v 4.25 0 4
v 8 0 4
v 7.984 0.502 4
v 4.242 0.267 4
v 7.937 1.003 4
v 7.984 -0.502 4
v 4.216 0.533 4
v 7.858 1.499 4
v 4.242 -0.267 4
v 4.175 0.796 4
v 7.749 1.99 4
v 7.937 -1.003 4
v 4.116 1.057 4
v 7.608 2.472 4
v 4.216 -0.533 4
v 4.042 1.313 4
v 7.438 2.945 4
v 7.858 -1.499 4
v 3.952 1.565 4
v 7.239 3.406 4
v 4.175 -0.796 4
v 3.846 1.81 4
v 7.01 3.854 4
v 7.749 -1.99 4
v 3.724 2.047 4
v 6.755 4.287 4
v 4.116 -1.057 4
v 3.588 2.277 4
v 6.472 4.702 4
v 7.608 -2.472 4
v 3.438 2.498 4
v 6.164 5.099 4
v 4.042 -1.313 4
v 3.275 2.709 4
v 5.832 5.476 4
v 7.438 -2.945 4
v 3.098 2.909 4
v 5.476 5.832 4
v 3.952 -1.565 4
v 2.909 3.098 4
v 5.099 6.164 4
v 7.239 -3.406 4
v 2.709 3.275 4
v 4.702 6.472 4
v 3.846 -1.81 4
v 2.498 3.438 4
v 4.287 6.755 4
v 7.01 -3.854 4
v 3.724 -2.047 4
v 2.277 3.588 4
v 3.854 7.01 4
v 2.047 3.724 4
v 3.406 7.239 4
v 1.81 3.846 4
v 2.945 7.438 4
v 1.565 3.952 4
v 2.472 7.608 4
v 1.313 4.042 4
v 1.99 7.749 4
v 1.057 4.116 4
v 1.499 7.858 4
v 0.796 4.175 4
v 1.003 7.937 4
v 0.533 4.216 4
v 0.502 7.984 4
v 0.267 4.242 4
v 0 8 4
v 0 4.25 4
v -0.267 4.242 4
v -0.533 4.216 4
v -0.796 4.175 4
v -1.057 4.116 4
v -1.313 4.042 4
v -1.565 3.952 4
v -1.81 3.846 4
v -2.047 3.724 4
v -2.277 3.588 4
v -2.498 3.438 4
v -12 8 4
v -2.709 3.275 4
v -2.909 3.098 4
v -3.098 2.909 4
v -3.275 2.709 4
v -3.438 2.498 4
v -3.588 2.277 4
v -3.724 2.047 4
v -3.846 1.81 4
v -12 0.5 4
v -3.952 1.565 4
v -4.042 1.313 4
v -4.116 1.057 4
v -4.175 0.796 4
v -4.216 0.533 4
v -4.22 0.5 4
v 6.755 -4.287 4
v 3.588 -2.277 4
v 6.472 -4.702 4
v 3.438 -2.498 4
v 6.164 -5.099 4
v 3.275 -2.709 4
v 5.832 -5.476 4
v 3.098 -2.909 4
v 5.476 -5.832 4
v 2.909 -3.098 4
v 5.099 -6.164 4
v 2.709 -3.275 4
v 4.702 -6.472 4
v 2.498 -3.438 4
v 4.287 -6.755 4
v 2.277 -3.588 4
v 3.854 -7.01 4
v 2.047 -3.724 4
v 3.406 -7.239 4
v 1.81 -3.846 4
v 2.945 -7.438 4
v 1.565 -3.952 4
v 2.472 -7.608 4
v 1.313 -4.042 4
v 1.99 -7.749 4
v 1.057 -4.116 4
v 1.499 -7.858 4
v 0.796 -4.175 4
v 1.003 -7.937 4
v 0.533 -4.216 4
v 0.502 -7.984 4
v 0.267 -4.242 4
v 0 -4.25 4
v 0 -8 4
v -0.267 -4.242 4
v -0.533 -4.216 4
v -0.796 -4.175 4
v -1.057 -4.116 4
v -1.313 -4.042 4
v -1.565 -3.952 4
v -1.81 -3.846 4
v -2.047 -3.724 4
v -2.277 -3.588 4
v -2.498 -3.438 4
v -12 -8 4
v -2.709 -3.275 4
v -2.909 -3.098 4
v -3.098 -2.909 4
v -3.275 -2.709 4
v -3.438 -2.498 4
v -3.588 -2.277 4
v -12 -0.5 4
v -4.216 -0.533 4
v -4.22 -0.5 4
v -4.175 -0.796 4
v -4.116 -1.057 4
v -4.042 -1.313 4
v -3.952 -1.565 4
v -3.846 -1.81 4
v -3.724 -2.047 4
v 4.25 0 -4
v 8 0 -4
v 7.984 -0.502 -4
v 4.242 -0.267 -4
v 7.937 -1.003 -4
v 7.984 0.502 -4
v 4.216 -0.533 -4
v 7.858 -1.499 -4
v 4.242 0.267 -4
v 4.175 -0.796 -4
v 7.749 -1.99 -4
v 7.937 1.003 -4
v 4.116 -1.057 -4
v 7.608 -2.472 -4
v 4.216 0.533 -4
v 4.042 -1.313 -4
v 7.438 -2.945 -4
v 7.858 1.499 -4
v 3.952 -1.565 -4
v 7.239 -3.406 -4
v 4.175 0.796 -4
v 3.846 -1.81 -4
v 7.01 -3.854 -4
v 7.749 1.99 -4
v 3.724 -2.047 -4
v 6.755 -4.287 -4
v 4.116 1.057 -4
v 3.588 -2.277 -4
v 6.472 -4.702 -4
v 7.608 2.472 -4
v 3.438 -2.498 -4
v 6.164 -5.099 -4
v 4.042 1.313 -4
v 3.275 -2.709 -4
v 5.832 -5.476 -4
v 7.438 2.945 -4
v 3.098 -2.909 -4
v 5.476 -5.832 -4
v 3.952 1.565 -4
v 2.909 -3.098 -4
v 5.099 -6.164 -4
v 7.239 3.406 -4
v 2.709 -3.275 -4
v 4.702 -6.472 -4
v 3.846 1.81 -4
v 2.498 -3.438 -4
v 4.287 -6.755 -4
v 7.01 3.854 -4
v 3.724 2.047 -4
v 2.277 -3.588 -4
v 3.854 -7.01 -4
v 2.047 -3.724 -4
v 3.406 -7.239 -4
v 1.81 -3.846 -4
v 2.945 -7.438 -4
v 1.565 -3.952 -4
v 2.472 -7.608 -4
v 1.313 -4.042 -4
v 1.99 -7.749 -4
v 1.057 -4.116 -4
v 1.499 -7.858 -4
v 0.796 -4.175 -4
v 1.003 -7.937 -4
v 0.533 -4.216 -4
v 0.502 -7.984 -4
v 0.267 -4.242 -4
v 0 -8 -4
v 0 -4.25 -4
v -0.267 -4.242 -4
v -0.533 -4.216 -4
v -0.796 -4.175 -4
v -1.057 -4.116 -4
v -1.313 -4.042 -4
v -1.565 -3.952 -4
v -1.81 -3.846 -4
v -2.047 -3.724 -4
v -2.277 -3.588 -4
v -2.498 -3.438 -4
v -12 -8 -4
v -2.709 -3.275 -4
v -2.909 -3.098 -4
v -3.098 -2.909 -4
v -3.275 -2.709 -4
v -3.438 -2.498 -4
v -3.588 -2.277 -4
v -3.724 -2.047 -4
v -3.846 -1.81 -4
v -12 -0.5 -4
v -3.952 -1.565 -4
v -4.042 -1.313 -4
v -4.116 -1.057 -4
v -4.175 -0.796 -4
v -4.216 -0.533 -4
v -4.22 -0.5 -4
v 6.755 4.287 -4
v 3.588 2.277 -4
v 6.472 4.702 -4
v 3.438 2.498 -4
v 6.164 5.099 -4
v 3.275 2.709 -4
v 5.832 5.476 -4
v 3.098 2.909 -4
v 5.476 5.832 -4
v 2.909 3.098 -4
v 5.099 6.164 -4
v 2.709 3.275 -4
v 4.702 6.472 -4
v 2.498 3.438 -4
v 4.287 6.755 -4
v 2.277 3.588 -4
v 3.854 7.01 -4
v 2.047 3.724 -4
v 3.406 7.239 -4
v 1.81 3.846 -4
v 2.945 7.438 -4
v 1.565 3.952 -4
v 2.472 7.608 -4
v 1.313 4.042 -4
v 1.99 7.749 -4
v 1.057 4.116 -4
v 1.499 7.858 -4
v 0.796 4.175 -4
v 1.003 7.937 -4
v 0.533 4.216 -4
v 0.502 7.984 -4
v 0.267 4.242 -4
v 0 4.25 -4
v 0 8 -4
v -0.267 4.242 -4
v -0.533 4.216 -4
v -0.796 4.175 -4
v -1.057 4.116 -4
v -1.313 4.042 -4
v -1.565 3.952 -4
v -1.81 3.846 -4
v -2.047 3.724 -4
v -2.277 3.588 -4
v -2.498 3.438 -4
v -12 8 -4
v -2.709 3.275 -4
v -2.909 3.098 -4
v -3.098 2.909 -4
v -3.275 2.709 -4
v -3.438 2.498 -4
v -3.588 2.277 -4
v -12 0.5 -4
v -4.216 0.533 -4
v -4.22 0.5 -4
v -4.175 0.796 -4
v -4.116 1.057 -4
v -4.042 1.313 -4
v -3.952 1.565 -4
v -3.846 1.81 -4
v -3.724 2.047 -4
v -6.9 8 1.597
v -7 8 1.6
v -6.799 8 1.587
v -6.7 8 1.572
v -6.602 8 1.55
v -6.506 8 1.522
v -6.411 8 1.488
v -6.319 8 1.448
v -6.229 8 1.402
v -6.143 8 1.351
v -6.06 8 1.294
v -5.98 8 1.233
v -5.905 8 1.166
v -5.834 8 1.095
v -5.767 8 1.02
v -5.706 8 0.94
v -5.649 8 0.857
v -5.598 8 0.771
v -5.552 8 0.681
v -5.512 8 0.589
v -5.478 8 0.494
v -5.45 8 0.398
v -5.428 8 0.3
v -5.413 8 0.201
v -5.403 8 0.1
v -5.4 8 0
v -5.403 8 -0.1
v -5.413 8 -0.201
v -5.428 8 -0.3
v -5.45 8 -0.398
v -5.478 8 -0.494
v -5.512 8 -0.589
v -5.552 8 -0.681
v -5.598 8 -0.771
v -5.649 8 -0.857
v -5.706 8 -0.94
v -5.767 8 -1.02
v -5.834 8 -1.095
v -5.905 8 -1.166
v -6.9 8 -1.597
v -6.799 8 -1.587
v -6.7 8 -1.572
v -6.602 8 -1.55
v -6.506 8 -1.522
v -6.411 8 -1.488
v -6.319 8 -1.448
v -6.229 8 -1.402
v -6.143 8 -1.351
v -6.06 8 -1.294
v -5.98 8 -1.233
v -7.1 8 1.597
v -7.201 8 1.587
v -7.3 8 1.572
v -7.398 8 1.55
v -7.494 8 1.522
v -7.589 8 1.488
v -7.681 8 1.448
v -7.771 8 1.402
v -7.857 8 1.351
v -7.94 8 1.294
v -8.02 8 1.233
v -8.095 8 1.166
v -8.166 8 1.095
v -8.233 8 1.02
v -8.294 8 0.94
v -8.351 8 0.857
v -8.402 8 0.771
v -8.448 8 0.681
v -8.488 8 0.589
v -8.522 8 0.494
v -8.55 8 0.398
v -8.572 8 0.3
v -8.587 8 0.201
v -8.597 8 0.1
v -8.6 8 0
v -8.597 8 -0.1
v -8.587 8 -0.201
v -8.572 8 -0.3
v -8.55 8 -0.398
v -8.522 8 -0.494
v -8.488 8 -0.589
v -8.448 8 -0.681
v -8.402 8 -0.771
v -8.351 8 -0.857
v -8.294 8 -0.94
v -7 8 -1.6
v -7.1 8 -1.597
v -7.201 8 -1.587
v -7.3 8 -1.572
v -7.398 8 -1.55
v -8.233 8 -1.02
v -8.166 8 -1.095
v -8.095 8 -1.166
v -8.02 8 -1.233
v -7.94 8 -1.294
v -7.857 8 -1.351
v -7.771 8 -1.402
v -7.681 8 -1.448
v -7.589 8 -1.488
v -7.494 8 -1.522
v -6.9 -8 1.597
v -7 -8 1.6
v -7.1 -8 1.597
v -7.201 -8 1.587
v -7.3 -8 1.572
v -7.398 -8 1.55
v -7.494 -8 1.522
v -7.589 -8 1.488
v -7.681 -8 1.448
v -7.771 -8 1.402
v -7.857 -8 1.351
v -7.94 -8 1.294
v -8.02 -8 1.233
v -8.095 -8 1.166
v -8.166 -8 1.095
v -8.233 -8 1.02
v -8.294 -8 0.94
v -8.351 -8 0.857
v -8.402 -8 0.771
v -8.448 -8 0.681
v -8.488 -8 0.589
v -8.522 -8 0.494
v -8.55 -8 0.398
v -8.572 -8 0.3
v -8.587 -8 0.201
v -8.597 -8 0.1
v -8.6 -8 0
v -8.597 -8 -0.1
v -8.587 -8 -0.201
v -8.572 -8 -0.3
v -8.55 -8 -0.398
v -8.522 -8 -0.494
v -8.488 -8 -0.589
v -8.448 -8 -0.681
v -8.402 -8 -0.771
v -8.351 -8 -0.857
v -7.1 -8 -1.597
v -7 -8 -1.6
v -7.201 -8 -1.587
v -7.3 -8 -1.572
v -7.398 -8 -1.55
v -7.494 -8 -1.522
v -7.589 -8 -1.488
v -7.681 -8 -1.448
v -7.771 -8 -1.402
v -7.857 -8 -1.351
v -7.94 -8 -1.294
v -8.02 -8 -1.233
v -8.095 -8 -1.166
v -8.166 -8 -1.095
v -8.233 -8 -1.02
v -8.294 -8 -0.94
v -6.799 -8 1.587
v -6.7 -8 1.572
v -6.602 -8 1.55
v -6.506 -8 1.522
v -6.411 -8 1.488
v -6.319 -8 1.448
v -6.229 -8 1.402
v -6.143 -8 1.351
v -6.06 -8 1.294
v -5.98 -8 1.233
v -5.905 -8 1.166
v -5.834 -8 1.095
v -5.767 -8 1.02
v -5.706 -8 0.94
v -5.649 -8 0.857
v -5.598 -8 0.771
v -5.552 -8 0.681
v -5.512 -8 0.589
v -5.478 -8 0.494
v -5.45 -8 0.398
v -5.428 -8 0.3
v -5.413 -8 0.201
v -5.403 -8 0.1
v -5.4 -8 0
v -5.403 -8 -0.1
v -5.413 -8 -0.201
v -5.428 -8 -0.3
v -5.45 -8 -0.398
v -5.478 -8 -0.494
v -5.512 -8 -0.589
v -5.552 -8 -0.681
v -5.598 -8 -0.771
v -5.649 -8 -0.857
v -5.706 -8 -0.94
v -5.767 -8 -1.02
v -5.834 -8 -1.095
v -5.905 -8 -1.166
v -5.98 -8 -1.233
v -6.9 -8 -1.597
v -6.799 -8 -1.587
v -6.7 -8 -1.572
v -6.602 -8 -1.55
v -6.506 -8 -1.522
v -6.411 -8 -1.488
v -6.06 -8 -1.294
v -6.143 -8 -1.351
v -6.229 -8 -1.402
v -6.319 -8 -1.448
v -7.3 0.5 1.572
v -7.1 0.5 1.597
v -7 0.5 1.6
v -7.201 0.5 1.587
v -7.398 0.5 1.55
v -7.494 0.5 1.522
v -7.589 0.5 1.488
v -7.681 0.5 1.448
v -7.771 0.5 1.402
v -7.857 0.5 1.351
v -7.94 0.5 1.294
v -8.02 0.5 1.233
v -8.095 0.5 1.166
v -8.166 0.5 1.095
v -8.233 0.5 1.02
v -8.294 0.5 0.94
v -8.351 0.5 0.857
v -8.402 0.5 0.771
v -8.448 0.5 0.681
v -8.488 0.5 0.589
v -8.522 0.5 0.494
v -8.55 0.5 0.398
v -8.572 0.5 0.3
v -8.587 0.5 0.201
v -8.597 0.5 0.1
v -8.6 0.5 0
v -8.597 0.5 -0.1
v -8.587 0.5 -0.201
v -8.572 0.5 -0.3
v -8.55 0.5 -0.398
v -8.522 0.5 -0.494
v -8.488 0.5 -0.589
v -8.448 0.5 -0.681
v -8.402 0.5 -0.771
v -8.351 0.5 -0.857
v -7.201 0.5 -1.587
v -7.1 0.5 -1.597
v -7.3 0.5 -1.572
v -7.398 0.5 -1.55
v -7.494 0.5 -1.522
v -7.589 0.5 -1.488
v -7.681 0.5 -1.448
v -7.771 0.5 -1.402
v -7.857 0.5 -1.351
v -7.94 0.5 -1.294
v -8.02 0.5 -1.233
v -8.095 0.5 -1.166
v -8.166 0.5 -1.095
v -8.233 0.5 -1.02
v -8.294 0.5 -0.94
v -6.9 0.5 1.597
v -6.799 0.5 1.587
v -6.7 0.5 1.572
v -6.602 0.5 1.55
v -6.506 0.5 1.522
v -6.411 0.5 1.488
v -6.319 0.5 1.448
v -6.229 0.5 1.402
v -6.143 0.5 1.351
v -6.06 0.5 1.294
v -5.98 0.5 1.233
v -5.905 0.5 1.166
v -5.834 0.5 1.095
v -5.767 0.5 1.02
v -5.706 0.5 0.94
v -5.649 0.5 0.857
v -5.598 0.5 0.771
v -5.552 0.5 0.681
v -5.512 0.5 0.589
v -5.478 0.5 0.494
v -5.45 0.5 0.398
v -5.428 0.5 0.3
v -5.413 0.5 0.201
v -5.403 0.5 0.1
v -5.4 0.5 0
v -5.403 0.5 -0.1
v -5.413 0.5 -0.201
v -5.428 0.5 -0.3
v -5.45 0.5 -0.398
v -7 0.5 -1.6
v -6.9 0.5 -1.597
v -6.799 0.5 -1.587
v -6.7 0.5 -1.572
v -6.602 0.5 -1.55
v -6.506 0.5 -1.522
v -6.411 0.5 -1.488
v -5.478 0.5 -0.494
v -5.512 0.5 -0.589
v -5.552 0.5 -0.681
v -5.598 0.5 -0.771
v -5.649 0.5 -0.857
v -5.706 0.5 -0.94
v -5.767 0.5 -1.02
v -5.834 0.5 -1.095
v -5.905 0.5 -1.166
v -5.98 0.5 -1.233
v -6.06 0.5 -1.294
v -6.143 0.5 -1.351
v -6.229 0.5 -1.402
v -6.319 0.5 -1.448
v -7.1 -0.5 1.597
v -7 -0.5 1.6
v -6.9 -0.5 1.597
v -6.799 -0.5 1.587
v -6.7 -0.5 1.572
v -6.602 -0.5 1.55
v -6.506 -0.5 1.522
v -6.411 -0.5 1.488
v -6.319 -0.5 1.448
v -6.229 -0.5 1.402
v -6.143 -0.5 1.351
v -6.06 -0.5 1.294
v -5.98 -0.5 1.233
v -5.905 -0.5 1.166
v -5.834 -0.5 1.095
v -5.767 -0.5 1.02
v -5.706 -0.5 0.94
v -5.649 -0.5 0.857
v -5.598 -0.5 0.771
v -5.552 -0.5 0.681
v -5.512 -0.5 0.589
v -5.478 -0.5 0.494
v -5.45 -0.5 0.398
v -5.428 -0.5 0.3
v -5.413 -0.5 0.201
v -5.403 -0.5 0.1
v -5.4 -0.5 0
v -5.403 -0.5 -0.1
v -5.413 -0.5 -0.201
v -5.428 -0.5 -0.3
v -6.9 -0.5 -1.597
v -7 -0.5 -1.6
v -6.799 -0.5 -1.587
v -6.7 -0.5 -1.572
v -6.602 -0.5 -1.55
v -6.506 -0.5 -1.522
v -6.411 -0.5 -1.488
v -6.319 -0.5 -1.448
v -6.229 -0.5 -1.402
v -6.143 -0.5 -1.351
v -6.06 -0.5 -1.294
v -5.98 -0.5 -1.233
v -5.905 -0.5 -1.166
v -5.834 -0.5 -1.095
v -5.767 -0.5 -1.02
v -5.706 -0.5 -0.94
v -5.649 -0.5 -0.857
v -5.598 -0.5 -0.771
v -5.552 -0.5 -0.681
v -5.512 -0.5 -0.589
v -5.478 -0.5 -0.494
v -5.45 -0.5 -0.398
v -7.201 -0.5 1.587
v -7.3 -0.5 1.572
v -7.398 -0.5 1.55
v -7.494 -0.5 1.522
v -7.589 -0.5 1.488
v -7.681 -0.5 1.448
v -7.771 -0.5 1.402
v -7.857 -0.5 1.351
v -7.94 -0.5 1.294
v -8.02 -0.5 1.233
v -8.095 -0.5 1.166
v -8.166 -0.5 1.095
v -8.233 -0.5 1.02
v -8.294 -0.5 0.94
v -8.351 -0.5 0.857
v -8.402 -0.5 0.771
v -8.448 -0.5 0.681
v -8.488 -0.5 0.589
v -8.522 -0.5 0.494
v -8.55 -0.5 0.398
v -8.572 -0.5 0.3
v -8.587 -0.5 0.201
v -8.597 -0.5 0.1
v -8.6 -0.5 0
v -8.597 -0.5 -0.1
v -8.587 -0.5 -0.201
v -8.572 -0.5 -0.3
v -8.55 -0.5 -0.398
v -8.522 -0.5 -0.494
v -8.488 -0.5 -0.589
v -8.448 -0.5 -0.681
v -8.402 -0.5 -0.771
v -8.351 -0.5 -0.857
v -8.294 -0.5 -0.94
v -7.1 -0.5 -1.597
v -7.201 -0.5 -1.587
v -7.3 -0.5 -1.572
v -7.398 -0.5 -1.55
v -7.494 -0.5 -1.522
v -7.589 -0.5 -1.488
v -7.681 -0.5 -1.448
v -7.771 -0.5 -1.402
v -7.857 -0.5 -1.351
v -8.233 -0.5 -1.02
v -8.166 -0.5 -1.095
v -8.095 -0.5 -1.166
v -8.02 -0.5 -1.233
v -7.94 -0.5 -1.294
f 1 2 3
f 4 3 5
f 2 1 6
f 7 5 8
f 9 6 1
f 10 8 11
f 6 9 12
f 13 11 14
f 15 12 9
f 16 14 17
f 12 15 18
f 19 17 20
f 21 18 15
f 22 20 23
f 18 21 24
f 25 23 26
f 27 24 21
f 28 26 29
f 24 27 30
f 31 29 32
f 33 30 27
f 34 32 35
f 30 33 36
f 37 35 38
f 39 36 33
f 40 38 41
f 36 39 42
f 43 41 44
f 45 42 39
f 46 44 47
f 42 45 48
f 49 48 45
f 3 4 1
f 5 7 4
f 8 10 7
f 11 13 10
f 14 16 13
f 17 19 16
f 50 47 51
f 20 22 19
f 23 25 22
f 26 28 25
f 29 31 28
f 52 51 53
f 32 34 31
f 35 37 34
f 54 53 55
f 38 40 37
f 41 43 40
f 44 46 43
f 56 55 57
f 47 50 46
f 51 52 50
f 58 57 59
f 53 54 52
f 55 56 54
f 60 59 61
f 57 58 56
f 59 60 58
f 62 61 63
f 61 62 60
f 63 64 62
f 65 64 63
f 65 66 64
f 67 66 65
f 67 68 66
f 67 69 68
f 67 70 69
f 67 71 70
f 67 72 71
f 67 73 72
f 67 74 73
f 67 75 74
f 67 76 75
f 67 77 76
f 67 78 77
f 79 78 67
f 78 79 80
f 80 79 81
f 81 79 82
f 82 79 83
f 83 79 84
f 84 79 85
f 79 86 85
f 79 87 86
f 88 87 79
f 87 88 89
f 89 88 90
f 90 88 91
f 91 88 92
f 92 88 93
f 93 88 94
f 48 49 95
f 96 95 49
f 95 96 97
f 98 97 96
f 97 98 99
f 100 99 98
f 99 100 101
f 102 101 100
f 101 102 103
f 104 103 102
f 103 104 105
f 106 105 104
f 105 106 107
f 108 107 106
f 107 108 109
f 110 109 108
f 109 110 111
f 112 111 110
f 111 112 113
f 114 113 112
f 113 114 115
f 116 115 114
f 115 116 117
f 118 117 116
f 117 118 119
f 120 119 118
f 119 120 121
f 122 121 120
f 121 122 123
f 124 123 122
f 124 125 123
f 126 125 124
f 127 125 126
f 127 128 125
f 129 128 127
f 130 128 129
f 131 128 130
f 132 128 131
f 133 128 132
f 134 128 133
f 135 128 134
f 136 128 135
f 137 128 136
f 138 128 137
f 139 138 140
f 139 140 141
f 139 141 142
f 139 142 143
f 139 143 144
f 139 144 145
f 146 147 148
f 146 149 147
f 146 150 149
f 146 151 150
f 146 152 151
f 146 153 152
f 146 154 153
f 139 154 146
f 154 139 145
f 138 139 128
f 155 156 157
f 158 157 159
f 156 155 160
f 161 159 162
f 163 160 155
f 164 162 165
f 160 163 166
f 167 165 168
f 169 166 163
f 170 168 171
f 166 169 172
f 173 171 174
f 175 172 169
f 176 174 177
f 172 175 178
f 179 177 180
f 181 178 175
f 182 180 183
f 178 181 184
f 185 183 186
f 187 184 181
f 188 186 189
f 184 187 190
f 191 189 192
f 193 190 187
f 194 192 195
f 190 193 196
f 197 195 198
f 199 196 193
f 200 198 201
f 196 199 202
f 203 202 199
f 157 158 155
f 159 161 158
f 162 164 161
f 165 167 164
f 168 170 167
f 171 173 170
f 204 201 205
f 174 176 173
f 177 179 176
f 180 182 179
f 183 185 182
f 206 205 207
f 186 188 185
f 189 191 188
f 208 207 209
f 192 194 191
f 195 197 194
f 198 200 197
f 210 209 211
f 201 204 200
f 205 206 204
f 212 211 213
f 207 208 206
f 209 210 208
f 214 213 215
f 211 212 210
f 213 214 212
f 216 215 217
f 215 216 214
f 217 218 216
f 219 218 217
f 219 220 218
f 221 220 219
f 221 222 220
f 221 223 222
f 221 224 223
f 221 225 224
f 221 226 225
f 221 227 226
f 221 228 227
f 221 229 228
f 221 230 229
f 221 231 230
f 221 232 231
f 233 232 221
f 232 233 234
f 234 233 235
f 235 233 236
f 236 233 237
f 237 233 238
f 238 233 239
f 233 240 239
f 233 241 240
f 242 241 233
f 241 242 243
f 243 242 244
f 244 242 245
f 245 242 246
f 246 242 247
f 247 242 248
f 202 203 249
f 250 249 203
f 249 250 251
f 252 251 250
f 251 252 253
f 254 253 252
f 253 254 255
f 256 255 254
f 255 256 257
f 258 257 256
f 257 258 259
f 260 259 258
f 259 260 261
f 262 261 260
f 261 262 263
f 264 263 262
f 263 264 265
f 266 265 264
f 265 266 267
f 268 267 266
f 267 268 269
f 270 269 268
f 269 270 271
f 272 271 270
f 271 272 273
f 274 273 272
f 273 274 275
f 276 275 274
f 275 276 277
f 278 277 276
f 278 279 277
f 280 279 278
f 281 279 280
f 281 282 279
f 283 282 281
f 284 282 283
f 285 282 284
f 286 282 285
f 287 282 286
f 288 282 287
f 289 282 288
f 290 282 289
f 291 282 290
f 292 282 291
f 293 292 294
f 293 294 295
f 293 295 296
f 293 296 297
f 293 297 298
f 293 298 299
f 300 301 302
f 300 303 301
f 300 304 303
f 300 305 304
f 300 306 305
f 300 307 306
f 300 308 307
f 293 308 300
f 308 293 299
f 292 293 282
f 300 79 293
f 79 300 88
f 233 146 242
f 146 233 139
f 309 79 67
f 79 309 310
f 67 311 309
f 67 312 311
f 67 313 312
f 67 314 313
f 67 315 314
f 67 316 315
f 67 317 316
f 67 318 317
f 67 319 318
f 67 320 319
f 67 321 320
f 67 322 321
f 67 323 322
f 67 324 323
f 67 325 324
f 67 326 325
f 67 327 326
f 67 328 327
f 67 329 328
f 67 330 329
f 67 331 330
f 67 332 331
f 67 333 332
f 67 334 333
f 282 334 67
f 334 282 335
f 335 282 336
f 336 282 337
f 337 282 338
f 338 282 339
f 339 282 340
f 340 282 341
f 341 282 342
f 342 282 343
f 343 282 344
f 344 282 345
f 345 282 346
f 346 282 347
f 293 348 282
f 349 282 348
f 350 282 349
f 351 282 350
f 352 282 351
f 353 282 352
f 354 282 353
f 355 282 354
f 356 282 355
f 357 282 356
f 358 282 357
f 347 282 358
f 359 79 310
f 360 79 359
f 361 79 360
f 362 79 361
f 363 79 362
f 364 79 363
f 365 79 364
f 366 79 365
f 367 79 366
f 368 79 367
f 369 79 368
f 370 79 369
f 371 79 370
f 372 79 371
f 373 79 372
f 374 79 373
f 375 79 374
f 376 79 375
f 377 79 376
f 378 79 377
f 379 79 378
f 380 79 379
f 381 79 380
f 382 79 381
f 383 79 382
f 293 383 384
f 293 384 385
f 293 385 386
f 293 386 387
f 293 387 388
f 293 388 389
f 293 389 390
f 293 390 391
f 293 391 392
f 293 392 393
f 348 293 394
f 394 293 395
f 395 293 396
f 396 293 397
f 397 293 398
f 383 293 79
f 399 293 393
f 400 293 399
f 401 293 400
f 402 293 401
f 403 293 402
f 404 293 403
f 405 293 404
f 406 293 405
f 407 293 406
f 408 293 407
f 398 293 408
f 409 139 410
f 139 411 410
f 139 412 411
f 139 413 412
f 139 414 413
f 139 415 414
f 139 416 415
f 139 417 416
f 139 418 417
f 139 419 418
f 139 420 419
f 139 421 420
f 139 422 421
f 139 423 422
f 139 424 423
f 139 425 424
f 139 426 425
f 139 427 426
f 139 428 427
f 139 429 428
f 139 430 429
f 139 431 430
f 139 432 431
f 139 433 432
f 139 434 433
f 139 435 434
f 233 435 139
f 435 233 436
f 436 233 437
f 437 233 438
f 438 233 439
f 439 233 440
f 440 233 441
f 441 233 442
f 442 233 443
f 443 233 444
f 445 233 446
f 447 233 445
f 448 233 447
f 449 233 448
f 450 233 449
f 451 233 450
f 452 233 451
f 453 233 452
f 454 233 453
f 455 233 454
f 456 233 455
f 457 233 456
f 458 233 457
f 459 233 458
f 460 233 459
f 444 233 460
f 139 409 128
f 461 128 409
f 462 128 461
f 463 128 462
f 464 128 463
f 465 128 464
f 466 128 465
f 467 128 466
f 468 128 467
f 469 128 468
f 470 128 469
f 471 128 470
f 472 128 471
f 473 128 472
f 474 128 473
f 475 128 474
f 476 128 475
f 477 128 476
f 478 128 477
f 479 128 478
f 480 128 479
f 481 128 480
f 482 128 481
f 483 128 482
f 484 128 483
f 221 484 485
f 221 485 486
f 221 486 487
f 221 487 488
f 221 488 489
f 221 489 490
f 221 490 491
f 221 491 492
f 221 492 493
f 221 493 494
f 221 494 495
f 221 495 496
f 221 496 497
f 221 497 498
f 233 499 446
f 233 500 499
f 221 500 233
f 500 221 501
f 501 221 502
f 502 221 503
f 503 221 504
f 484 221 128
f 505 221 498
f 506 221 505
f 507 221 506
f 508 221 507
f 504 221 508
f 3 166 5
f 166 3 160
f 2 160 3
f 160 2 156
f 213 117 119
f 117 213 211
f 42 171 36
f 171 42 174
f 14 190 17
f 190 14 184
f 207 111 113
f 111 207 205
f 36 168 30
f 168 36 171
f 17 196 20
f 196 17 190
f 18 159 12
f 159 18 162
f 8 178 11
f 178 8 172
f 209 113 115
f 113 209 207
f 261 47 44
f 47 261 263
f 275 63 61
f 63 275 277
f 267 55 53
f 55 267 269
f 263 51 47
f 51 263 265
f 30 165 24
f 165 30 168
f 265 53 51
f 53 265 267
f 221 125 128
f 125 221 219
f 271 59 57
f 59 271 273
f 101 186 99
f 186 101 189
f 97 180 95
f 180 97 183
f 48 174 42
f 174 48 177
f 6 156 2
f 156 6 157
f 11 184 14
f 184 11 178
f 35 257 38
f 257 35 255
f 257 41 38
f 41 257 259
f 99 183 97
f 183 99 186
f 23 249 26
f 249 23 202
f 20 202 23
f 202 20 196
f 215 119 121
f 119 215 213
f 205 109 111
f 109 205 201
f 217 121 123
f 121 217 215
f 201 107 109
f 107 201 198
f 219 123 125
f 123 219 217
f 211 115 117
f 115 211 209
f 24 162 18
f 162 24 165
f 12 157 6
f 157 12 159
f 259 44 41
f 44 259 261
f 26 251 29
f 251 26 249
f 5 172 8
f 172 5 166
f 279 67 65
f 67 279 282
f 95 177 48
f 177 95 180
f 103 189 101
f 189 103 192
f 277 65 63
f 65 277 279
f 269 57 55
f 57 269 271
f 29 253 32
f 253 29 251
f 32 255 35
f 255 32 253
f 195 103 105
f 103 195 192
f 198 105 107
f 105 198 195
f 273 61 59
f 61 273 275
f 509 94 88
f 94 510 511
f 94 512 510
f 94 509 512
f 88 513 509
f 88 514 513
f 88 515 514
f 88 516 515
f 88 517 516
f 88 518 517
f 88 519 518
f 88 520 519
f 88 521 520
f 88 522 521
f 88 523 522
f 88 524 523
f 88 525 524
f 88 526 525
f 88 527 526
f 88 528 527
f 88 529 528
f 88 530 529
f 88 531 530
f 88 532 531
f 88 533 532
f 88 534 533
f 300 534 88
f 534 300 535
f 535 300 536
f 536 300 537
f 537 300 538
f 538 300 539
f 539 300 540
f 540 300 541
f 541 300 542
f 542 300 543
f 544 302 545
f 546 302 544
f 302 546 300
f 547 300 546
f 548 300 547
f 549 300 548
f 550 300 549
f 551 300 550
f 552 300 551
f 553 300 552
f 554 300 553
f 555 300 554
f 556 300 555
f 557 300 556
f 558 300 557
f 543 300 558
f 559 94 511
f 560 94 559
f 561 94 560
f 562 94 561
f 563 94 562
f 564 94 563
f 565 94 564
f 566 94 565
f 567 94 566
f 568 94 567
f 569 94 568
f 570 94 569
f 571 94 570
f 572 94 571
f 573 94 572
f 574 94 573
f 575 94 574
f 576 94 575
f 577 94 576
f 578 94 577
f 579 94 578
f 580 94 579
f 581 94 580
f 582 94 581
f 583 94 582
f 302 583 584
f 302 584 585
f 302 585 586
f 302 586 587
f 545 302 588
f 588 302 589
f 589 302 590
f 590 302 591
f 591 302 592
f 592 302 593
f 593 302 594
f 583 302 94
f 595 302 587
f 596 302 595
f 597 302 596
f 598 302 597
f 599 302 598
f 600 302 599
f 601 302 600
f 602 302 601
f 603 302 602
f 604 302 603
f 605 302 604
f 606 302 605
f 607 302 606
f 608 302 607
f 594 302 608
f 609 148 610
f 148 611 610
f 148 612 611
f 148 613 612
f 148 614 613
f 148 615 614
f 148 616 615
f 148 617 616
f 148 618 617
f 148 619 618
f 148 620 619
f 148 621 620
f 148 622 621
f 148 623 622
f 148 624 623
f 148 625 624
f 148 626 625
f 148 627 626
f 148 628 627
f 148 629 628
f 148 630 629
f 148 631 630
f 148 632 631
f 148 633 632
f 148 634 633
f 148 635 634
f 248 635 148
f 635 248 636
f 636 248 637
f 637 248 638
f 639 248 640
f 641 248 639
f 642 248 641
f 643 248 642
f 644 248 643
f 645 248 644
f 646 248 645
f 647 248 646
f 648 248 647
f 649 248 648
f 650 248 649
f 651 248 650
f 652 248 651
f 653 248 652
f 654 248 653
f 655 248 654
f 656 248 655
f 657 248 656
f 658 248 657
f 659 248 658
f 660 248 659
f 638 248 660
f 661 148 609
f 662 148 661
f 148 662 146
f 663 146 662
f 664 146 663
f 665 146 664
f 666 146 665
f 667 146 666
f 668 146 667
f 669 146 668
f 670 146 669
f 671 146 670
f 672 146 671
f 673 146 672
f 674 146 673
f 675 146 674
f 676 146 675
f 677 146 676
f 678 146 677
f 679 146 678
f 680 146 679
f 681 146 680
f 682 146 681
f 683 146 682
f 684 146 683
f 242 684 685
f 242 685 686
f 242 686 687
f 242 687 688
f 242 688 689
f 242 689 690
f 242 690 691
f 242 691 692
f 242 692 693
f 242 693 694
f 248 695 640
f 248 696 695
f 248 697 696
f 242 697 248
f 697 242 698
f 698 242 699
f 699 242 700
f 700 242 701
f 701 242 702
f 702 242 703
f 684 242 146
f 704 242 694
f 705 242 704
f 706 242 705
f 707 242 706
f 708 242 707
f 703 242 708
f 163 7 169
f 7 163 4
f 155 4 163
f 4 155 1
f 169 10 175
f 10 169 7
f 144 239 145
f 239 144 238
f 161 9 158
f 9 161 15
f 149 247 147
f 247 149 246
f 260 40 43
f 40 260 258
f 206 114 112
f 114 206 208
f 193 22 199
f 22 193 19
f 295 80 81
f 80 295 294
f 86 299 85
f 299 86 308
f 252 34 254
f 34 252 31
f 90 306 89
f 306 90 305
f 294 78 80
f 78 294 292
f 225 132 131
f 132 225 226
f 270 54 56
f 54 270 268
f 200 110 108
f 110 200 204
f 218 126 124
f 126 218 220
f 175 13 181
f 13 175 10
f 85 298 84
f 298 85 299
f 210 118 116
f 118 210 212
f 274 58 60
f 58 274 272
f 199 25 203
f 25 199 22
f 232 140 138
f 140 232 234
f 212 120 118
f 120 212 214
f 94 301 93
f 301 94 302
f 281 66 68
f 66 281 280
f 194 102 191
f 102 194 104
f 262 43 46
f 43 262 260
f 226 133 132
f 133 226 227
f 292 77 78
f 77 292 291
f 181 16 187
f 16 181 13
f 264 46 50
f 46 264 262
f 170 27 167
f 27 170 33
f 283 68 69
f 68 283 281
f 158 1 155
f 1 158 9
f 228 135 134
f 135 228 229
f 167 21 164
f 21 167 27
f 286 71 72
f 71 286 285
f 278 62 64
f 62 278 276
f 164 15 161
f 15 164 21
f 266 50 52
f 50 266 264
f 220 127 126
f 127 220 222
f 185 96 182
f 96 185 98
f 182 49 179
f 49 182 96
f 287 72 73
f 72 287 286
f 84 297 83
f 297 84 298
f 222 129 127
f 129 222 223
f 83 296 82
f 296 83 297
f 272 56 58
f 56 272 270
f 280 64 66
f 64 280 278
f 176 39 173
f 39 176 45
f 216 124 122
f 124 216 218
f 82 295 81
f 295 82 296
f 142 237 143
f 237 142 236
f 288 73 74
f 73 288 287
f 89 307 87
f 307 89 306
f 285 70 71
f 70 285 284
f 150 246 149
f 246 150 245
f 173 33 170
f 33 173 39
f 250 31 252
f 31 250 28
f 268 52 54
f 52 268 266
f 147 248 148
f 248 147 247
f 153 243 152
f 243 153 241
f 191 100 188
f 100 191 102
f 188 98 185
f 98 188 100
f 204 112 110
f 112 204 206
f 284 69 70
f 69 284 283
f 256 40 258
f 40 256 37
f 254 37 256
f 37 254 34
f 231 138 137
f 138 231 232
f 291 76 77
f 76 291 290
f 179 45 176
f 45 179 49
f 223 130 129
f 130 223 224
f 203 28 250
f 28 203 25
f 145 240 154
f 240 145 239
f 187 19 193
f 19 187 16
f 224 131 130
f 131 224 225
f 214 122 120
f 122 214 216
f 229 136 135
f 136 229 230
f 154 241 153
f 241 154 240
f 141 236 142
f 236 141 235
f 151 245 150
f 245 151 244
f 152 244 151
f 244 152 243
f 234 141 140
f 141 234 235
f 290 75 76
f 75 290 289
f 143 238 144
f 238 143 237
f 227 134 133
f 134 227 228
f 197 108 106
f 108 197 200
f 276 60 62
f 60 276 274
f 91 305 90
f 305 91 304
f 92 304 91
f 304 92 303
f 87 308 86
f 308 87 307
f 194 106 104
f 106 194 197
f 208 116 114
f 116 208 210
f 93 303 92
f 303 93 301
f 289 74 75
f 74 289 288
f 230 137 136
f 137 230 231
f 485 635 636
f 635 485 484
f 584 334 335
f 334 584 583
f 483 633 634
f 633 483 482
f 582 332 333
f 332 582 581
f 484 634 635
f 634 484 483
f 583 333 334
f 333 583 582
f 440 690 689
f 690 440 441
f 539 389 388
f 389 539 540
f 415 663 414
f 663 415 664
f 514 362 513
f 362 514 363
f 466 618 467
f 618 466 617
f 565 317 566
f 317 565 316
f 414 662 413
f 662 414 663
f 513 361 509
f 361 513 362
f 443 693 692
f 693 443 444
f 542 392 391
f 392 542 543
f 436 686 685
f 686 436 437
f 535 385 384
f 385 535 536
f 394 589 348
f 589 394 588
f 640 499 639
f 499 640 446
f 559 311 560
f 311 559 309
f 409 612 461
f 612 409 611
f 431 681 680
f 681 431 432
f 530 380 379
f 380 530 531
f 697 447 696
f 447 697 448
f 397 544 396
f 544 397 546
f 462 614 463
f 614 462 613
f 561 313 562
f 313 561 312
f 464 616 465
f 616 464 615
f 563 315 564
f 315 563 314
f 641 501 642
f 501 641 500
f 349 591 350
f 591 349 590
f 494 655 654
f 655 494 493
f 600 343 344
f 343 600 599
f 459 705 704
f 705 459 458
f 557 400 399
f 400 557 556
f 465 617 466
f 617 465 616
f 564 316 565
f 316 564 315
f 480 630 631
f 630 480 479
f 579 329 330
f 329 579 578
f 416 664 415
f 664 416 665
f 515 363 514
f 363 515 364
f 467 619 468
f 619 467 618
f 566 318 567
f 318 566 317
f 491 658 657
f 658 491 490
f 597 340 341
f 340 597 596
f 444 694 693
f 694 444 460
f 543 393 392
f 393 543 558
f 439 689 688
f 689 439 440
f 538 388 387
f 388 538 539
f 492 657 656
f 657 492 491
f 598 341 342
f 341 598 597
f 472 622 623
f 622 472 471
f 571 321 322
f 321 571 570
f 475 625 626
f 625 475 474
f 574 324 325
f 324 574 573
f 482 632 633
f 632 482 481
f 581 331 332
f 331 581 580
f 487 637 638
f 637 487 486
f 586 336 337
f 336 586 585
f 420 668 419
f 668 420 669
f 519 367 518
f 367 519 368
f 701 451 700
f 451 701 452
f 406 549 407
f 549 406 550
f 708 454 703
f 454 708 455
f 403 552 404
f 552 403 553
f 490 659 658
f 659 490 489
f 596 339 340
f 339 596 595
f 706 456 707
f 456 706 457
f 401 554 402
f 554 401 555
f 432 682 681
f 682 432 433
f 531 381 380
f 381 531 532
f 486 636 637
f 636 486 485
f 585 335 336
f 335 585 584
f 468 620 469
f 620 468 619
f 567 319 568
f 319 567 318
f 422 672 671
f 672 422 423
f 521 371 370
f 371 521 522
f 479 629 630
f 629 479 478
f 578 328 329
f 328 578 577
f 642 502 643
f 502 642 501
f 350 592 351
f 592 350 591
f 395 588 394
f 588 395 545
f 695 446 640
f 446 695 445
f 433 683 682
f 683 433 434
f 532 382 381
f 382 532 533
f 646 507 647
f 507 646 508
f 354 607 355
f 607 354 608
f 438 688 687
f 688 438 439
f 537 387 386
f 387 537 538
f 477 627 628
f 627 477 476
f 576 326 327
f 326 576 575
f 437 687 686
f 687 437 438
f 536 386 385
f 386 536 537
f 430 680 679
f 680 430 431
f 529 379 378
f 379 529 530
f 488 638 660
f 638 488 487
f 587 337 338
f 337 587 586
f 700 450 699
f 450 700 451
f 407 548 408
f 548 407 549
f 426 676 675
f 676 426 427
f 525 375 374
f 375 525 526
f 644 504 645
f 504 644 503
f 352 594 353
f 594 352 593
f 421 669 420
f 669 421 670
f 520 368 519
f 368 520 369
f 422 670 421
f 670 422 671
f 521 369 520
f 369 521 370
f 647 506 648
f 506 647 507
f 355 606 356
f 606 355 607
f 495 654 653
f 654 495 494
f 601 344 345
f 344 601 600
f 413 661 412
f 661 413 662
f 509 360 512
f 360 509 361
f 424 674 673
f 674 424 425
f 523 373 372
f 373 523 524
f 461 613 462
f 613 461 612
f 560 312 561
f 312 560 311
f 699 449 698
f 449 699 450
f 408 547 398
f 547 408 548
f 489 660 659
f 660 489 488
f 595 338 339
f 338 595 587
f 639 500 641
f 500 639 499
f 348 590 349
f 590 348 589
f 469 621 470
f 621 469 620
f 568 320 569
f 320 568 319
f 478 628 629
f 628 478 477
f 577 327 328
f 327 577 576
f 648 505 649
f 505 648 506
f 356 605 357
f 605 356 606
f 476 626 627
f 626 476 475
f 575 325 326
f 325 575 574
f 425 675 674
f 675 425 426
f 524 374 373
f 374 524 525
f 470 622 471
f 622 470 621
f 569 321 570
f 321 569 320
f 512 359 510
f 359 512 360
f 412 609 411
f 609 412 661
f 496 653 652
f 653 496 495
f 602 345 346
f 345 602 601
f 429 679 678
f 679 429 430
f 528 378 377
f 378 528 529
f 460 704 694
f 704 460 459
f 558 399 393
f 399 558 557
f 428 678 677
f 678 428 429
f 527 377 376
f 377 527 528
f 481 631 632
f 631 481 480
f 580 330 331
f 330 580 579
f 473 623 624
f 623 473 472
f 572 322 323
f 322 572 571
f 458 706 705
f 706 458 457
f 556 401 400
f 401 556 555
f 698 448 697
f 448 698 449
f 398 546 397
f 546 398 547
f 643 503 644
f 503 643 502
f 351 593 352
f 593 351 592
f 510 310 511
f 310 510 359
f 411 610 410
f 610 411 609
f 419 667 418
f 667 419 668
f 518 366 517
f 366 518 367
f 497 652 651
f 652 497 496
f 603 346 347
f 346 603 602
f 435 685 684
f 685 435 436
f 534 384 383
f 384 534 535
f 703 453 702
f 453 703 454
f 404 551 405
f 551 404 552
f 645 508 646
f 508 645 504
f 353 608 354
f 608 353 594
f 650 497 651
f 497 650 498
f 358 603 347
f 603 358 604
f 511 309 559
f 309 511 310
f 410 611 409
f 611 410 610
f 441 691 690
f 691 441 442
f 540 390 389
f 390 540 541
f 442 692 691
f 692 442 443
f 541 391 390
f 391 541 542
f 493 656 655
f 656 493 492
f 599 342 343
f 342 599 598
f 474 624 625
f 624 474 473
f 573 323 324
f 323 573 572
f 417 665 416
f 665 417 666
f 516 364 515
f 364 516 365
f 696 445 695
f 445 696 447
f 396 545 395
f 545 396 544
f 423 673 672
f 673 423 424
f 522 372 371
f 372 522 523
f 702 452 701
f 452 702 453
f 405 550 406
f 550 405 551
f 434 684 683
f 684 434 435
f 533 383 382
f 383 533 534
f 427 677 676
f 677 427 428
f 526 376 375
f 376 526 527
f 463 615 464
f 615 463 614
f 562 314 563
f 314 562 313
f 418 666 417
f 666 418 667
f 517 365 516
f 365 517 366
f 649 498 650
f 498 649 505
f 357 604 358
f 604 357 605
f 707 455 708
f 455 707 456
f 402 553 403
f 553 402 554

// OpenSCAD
height=8;
radius=4.25;
difference(){
union(){
translate([-6,0,0]) cube([12,16,height],center=true);
cylinder(h=height,r=8, center=true, $fn=100);
}
translate([-10,0,0]) cube([20,1,height+4],center=true);
cylinder(h=30,r=radius, center=true, $fn=100);
translate([-7,0,0]) rotate([90,0,0]) cylinder(h=30,r=1.6, center=true, $fn=100);
}
